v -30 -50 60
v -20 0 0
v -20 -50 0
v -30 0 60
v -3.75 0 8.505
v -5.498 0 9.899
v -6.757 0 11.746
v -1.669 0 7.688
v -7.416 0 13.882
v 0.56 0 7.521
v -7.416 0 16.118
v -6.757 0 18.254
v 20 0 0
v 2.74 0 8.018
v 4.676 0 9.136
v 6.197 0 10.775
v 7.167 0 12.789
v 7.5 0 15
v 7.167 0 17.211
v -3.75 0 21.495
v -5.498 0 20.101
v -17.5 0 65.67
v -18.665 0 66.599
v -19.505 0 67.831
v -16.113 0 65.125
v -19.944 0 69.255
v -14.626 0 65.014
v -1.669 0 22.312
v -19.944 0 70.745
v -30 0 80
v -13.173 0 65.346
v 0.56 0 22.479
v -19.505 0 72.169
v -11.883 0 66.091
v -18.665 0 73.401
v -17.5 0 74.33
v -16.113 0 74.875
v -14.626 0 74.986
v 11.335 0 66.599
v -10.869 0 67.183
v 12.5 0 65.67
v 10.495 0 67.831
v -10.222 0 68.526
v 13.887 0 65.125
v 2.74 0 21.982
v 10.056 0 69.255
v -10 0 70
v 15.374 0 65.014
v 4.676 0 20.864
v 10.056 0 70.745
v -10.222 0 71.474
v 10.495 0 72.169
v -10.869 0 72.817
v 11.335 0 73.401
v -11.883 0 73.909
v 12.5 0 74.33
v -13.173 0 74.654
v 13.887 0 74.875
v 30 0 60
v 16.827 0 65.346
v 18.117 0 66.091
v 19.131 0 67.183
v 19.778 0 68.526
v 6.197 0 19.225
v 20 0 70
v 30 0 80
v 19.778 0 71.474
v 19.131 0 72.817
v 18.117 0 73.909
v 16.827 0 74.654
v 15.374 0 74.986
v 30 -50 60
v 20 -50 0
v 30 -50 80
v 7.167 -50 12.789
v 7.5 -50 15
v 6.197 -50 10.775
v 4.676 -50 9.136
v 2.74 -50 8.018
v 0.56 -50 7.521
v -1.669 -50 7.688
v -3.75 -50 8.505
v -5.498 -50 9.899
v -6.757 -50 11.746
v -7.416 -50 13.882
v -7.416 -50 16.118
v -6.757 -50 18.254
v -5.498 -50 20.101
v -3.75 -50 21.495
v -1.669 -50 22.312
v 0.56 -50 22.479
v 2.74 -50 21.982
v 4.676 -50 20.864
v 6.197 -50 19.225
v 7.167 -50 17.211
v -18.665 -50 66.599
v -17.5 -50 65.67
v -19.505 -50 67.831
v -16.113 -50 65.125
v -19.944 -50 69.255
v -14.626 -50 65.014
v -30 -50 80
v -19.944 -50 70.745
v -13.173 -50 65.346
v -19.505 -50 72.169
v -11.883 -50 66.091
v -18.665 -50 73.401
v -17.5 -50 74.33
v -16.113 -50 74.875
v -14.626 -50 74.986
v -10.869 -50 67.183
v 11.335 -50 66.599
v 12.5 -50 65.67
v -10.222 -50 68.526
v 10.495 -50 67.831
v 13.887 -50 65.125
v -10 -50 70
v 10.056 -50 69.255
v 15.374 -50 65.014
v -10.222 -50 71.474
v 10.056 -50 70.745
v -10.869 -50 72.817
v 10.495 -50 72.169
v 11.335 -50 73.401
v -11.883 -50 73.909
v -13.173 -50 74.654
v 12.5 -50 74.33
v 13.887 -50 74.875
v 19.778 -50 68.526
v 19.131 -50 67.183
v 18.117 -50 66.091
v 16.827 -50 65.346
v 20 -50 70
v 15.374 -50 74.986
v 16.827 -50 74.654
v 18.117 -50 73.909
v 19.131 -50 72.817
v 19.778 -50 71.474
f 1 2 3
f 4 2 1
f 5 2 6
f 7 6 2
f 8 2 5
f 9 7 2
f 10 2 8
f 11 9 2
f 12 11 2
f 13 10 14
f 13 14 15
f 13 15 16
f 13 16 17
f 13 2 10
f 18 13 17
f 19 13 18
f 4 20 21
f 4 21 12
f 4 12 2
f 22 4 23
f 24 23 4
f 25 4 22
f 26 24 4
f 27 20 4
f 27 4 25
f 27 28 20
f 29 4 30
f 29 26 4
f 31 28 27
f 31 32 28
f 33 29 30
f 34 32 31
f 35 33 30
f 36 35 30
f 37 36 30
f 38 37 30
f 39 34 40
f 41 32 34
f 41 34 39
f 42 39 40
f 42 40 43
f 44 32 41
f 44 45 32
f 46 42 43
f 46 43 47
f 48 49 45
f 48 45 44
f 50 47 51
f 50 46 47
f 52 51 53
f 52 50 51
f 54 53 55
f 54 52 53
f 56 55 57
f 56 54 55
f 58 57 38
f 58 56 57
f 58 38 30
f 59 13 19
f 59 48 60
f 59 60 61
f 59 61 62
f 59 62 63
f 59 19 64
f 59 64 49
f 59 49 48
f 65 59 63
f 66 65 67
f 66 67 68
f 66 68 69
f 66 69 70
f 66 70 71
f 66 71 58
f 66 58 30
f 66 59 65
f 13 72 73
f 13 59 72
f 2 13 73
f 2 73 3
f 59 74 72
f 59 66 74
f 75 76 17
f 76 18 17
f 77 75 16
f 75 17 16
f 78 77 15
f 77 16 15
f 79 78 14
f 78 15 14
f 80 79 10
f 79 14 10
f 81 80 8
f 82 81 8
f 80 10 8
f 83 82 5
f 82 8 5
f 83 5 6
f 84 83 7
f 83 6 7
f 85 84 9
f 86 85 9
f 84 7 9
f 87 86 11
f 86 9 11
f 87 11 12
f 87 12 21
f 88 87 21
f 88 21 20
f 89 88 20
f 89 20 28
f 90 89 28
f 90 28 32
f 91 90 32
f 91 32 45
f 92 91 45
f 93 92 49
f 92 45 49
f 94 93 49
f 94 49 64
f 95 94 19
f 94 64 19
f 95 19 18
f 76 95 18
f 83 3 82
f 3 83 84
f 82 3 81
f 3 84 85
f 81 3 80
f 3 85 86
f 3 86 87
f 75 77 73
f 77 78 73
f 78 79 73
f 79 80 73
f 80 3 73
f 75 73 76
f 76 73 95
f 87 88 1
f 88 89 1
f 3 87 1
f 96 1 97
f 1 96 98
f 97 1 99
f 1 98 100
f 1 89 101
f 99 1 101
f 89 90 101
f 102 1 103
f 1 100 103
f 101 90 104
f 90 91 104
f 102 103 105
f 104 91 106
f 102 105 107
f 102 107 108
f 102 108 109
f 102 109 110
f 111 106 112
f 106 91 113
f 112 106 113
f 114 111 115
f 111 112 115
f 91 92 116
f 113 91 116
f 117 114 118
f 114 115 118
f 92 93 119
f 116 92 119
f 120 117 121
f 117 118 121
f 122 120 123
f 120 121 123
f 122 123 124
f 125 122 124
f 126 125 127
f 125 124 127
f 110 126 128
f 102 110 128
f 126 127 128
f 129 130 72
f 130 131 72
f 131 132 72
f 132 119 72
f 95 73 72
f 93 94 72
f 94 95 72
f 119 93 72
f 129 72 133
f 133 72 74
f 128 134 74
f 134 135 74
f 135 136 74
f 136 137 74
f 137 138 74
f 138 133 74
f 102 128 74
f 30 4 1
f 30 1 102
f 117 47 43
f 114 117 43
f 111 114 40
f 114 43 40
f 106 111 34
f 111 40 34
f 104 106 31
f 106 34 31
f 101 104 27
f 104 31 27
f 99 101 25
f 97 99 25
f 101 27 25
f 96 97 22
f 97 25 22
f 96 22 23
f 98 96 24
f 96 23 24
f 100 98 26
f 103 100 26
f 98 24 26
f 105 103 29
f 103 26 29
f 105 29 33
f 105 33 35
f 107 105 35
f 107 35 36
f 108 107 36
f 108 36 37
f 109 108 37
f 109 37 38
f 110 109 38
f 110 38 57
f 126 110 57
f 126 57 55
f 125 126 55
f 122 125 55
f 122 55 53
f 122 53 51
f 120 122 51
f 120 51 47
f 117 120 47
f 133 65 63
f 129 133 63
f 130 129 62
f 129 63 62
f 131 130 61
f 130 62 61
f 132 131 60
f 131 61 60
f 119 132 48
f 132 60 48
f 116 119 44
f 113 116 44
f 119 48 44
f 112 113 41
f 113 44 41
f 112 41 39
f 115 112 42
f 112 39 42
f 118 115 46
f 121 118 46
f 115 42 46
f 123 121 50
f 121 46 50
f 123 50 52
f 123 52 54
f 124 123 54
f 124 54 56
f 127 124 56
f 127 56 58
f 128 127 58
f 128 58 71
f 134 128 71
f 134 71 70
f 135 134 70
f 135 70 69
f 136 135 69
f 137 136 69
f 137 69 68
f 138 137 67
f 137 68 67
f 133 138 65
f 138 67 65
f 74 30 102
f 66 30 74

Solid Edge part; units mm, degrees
sketch "Sketch1" plane through (0, 0, 0) normal (0, -1, 0) x (1, 0, 0)
  line L0 (-20, 0) -> (-30, 60)
  line L1 (-30, 60) -> (-30, 80)
  line L2 (-30, 80) -> (30, 80)
  line L3 (30, 80) -> (30, 60)
  line L4 (30, 60) -> (20, 0)
  line L5 (20, 0) -> (-20, 0)
extrude "Protrusion1" add sketch "Sketch1" along normal blind 50
sketch "Sketch2" plane through (0, 0, 0) normal (0, -1, 0) x (1, 0, 0)
  circle A0 centre (0, 15) radius 7.5
extrude "Cutout1" cut sketch "Sketch2" along normal through all
sketch "Sketch3" plane through (0, 0, 0) normal (0, -1, 0) x (1, 0, 0)
  circle A0 centre (-15, 70) radius 5
extrude "Cutout2" cut sketch "Sketch3" along normal through all
sketch "Sketch4" plane through (0, 0, 0) normal (0, -1, 0) x (1, 0, 0)
  circle A0 centre (15, 70) radius 5
extrude "Cutout3" cut sketch "Sketch4" along normal through all
